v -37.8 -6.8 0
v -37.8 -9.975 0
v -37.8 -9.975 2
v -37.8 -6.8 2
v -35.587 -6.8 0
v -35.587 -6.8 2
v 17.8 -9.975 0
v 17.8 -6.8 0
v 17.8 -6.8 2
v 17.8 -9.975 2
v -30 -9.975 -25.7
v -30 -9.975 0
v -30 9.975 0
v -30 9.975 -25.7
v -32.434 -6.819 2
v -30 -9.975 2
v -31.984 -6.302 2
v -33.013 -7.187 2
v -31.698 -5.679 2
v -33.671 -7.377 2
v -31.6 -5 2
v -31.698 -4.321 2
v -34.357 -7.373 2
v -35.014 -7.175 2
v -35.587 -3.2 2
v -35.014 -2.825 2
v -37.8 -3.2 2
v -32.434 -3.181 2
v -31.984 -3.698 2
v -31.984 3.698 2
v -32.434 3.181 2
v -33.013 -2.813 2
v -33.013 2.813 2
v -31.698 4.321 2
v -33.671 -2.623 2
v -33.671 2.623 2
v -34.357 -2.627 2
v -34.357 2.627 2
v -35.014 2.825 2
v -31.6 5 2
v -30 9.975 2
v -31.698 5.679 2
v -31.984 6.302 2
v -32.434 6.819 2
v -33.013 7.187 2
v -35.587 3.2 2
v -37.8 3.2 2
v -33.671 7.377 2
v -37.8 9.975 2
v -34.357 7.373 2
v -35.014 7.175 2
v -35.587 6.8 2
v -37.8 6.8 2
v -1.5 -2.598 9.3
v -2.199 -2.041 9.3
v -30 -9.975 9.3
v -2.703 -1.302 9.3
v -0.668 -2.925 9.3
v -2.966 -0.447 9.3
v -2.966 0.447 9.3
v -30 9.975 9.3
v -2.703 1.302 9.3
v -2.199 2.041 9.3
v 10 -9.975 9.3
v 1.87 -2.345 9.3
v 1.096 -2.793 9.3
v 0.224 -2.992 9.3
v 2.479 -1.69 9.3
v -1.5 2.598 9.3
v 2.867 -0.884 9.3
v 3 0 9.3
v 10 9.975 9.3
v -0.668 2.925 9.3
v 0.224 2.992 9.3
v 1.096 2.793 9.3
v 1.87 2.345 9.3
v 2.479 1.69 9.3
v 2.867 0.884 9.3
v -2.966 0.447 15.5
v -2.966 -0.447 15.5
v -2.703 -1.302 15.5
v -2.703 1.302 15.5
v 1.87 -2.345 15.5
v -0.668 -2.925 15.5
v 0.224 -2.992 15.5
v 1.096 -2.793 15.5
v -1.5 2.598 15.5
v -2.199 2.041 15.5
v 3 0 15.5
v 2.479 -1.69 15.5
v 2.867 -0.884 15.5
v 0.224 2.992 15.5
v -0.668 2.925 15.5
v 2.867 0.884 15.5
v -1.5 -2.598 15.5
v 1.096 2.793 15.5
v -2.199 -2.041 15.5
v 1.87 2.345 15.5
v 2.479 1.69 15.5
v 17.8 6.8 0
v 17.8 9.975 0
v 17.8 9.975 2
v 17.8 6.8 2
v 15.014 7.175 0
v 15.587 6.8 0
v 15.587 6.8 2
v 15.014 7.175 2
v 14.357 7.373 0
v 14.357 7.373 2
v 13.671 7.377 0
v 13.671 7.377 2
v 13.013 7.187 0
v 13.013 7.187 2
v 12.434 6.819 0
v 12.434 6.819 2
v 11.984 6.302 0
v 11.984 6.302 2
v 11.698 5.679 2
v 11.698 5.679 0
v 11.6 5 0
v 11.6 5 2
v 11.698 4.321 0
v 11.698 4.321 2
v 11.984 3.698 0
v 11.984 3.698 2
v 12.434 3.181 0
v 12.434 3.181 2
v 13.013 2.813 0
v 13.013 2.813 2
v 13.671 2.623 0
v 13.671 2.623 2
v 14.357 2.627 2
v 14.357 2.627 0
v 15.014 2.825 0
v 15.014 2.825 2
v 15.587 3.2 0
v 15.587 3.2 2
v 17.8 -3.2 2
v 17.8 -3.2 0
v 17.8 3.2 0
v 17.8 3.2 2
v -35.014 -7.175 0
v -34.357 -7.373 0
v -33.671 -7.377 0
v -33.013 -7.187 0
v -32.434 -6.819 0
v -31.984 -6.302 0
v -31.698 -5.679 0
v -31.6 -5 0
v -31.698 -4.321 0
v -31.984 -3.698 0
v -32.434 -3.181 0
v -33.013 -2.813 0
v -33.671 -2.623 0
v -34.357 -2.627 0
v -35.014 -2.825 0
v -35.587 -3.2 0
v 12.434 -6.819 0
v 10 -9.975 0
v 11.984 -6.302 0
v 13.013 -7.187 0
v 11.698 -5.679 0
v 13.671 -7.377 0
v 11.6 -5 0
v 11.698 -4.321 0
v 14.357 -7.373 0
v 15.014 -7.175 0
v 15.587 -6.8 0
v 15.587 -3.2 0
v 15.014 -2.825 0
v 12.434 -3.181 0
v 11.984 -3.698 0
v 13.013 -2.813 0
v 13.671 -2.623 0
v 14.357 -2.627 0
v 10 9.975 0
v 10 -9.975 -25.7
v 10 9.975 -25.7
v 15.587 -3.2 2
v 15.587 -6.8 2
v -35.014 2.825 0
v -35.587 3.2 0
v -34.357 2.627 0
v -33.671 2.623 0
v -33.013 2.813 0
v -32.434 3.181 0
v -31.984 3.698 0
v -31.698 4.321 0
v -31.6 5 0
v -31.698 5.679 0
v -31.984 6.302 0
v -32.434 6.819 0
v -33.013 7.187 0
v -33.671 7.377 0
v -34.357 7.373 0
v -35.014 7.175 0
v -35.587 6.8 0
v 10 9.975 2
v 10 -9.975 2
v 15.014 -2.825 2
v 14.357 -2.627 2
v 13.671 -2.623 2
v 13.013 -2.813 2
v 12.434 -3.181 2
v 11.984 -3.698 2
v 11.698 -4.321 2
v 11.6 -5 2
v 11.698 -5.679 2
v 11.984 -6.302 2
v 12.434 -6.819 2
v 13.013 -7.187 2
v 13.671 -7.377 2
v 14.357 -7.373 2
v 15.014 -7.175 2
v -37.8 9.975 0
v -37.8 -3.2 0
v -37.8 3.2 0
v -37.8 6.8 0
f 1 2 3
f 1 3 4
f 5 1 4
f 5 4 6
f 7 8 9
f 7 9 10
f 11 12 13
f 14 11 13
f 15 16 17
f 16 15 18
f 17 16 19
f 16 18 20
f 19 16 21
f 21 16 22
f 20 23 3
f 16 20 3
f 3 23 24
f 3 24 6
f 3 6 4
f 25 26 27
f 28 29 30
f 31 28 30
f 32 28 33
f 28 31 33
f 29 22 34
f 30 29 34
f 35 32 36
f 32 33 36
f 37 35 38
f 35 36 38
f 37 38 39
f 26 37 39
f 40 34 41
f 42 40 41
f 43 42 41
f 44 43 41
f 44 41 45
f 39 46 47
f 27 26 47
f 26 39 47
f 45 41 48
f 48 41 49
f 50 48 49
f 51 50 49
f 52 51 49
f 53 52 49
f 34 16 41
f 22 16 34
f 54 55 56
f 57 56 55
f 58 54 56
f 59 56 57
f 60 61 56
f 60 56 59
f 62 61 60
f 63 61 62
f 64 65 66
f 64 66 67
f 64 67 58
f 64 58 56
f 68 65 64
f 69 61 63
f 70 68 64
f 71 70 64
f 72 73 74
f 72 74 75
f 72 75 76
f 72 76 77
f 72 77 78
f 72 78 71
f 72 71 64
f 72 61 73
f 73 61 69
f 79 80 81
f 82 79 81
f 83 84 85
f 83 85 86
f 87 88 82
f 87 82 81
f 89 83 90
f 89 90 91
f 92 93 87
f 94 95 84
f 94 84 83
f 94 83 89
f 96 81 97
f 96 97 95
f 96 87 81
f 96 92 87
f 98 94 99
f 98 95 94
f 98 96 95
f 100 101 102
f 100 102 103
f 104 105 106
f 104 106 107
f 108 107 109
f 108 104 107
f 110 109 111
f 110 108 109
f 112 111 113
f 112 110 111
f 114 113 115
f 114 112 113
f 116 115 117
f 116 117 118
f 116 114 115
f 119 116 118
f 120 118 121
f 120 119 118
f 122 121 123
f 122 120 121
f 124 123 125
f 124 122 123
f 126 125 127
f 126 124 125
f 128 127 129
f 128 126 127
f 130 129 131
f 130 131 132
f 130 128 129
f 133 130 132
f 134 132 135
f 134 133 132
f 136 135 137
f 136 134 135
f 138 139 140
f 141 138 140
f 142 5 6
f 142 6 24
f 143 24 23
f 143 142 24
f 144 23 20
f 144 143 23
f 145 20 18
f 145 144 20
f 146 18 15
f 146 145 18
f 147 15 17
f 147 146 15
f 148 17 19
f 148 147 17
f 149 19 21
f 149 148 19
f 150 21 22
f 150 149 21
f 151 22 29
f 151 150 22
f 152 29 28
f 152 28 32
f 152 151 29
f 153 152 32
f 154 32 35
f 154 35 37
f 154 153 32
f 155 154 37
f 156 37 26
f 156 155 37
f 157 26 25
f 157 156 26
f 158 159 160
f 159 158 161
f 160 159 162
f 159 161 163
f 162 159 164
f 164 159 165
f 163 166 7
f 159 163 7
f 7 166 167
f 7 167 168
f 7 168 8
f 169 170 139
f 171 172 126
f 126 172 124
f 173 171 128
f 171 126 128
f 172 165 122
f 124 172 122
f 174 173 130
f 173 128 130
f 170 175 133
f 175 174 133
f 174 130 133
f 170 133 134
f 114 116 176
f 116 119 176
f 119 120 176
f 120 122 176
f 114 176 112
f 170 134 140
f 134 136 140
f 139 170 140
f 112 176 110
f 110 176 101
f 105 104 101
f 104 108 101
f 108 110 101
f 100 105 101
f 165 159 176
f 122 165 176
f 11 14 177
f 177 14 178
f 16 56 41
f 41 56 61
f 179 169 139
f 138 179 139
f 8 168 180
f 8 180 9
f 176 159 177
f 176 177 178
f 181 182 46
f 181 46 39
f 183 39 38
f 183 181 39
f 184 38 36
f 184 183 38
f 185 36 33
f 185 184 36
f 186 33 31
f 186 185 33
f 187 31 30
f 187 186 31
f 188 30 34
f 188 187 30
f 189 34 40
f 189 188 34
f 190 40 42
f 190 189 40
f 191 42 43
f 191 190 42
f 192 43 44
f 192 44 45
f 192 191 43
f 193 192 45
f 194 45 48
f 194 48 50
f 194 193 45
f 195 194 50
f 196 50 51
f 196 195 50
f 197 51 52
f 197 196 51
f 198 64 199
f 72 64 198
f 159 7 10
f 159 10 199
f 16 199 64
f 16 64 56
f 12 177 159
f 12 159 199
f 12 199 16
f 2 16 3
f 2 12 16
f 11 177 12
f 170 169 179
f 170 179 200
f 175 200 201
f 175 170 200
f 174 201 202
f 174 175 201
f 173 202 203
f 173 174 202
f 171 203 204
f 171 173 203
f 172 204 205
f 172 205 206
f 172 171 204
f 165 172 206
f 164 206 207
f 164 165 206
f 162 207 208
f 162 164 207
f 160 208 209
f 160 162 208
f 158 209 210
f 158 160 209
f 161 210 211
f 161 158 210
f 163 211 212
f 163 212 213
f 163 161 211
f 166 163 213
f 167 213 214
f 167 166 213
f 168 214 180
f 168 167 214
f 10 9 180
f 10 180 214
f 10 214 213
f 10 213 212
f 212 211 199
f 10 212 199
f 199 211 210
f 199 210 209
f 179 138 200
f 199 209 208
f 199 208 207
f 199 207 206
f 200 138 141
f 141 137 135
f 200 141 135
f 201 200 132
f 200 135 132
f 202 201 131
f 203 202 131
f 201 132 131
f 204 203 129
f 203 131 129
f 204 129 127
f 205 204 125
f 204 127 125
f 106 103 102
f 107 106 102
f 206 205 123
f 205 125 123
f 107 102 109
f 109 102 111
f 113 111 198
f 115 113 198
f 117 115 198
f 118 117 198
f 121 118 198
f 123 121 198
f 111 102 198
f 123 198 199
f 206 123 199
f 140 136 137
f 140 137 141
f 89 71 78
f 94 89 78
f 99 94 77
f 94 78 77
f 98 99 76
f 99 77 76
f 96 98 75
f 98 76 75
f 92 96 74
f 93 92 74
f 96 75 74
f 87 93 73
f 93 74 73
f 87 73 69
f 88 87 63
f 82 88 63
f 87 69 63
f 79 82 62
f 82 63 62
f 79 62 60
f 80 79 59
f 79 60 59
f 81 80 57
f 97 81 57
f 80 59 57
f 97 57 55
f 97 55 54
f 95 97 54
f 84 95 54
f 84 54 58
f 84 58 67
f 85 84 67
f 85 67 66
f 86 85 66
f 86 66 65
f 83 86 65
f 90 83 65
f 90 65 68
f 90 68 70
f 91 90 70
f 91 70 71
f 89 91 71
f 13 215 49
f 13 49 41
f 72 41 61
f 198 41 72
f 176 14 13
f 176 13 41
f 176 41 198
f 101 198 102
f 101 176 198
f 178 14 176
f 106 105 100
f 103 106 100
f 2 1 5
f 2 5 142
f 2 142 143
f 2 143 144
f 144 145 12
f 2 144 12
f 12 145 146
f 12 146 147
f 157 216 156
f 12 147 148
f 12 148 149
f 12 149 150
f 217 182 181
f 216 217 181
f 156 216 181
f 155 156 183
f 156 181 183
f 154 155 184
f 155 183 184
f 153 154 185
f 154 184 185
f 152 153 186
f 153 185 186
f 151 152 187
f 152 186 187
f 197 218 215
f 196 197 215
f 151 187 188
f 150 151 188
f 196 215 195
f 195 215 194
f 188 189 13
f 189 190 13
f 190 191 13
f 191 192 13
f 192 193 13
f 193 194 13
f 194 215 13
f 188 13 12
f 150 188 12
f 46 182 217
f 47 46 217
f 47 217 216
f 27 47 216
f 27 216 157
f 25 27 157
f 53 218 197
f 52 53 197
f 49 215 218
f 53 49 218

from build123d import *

# Parameters (mm, degrees)
SKETCH003_R      = 3
EXTRUDE004_DEPTH = 15.5
EXTRUDE002_DEPTH = 2
SKETCH001_W      = 40
SKETCH001_H      = 19.95
EXTRUDE001_DEPTH = 35


with BuildPart() as extrude004:
    # Sketch003 → Extrude004 (new body)
    with BuildSketch(Plane.XY):
        Circle(SKETCH003_R)
    extrude(amount=EXTRUDE004_DEPTH)


with BuildPart() as fusion:
    # Sketch → Extrude002 (new body)
    with BuildSketch(Plane.XY):
        with BuildLine():
            Line((-37.8, 9.975), (17.8, 9.975))
            Line((17.8, 9.975), (17.8, 6.8))
            Line((15.587451, 6.8), (17.8, 6.8))
            ThreePointArc((15.587451, 6.8), (11.6, 5), (15.587451, 3.2))
            Line((15.587451, 3.2), (17.8, 3.2))
            Line((17.8, -3.2), (17.8, 3.2))
            Line((15.587451, -3.2), (17.8, -3.2))
            ThreePointArc((15.587451, -3.2), (11.6, -5), (15.587451, -6.8))
            Line((15.587451, -6.8), (17.8, -6.8))
            Line((17.8, -6.8), (17.8, -9.975))
            Line((17.8, -9.975), (-37.8, -9.975))
            Line((-37.8, -9.975), (-37.8, -6.8))
            Line((-37.8, -6.8), (-35.587451, -6.8))
            ThreePointArc((-35.587451, -6.8), (-31.6, -5), (-35.587451, -3.2))
            Line((-37.8, -3.2), (-35.587451, -3.2))
            Line((-37.8, 3.2), (-37.8, -3.2))
            Line((-35.587451, 3.2), (-37.8, 3.2))
            ThreePointArc((-35.587451, 3.2), (-31.6, 5), (-35.587451, 6.8))
            Line((-37.8, 6.8), (-35.587451, 6.8))
            Line((-37.8, 9.975), (-37.8, 6.8))
        make_face()
    extrude(amount=EXTRUDE002_DEPTH)

    # Fusion: union Extrude004
    add(extrude004.part)


with BuildPart() as fusion001:
    # Sketch001 → Extrude001 (new body)
    with BuildSketch(Plane.XY.offset(9.3)):
        with Locations((-10, 0)):
            Rectangle(SKETCH001_W, SKETCH001_H)
    extrude(amount=-EXTRUDE001_DEPTH)

    # Fusion001: union Fusion
    add(fusion.part)


solid = fusion001.part
